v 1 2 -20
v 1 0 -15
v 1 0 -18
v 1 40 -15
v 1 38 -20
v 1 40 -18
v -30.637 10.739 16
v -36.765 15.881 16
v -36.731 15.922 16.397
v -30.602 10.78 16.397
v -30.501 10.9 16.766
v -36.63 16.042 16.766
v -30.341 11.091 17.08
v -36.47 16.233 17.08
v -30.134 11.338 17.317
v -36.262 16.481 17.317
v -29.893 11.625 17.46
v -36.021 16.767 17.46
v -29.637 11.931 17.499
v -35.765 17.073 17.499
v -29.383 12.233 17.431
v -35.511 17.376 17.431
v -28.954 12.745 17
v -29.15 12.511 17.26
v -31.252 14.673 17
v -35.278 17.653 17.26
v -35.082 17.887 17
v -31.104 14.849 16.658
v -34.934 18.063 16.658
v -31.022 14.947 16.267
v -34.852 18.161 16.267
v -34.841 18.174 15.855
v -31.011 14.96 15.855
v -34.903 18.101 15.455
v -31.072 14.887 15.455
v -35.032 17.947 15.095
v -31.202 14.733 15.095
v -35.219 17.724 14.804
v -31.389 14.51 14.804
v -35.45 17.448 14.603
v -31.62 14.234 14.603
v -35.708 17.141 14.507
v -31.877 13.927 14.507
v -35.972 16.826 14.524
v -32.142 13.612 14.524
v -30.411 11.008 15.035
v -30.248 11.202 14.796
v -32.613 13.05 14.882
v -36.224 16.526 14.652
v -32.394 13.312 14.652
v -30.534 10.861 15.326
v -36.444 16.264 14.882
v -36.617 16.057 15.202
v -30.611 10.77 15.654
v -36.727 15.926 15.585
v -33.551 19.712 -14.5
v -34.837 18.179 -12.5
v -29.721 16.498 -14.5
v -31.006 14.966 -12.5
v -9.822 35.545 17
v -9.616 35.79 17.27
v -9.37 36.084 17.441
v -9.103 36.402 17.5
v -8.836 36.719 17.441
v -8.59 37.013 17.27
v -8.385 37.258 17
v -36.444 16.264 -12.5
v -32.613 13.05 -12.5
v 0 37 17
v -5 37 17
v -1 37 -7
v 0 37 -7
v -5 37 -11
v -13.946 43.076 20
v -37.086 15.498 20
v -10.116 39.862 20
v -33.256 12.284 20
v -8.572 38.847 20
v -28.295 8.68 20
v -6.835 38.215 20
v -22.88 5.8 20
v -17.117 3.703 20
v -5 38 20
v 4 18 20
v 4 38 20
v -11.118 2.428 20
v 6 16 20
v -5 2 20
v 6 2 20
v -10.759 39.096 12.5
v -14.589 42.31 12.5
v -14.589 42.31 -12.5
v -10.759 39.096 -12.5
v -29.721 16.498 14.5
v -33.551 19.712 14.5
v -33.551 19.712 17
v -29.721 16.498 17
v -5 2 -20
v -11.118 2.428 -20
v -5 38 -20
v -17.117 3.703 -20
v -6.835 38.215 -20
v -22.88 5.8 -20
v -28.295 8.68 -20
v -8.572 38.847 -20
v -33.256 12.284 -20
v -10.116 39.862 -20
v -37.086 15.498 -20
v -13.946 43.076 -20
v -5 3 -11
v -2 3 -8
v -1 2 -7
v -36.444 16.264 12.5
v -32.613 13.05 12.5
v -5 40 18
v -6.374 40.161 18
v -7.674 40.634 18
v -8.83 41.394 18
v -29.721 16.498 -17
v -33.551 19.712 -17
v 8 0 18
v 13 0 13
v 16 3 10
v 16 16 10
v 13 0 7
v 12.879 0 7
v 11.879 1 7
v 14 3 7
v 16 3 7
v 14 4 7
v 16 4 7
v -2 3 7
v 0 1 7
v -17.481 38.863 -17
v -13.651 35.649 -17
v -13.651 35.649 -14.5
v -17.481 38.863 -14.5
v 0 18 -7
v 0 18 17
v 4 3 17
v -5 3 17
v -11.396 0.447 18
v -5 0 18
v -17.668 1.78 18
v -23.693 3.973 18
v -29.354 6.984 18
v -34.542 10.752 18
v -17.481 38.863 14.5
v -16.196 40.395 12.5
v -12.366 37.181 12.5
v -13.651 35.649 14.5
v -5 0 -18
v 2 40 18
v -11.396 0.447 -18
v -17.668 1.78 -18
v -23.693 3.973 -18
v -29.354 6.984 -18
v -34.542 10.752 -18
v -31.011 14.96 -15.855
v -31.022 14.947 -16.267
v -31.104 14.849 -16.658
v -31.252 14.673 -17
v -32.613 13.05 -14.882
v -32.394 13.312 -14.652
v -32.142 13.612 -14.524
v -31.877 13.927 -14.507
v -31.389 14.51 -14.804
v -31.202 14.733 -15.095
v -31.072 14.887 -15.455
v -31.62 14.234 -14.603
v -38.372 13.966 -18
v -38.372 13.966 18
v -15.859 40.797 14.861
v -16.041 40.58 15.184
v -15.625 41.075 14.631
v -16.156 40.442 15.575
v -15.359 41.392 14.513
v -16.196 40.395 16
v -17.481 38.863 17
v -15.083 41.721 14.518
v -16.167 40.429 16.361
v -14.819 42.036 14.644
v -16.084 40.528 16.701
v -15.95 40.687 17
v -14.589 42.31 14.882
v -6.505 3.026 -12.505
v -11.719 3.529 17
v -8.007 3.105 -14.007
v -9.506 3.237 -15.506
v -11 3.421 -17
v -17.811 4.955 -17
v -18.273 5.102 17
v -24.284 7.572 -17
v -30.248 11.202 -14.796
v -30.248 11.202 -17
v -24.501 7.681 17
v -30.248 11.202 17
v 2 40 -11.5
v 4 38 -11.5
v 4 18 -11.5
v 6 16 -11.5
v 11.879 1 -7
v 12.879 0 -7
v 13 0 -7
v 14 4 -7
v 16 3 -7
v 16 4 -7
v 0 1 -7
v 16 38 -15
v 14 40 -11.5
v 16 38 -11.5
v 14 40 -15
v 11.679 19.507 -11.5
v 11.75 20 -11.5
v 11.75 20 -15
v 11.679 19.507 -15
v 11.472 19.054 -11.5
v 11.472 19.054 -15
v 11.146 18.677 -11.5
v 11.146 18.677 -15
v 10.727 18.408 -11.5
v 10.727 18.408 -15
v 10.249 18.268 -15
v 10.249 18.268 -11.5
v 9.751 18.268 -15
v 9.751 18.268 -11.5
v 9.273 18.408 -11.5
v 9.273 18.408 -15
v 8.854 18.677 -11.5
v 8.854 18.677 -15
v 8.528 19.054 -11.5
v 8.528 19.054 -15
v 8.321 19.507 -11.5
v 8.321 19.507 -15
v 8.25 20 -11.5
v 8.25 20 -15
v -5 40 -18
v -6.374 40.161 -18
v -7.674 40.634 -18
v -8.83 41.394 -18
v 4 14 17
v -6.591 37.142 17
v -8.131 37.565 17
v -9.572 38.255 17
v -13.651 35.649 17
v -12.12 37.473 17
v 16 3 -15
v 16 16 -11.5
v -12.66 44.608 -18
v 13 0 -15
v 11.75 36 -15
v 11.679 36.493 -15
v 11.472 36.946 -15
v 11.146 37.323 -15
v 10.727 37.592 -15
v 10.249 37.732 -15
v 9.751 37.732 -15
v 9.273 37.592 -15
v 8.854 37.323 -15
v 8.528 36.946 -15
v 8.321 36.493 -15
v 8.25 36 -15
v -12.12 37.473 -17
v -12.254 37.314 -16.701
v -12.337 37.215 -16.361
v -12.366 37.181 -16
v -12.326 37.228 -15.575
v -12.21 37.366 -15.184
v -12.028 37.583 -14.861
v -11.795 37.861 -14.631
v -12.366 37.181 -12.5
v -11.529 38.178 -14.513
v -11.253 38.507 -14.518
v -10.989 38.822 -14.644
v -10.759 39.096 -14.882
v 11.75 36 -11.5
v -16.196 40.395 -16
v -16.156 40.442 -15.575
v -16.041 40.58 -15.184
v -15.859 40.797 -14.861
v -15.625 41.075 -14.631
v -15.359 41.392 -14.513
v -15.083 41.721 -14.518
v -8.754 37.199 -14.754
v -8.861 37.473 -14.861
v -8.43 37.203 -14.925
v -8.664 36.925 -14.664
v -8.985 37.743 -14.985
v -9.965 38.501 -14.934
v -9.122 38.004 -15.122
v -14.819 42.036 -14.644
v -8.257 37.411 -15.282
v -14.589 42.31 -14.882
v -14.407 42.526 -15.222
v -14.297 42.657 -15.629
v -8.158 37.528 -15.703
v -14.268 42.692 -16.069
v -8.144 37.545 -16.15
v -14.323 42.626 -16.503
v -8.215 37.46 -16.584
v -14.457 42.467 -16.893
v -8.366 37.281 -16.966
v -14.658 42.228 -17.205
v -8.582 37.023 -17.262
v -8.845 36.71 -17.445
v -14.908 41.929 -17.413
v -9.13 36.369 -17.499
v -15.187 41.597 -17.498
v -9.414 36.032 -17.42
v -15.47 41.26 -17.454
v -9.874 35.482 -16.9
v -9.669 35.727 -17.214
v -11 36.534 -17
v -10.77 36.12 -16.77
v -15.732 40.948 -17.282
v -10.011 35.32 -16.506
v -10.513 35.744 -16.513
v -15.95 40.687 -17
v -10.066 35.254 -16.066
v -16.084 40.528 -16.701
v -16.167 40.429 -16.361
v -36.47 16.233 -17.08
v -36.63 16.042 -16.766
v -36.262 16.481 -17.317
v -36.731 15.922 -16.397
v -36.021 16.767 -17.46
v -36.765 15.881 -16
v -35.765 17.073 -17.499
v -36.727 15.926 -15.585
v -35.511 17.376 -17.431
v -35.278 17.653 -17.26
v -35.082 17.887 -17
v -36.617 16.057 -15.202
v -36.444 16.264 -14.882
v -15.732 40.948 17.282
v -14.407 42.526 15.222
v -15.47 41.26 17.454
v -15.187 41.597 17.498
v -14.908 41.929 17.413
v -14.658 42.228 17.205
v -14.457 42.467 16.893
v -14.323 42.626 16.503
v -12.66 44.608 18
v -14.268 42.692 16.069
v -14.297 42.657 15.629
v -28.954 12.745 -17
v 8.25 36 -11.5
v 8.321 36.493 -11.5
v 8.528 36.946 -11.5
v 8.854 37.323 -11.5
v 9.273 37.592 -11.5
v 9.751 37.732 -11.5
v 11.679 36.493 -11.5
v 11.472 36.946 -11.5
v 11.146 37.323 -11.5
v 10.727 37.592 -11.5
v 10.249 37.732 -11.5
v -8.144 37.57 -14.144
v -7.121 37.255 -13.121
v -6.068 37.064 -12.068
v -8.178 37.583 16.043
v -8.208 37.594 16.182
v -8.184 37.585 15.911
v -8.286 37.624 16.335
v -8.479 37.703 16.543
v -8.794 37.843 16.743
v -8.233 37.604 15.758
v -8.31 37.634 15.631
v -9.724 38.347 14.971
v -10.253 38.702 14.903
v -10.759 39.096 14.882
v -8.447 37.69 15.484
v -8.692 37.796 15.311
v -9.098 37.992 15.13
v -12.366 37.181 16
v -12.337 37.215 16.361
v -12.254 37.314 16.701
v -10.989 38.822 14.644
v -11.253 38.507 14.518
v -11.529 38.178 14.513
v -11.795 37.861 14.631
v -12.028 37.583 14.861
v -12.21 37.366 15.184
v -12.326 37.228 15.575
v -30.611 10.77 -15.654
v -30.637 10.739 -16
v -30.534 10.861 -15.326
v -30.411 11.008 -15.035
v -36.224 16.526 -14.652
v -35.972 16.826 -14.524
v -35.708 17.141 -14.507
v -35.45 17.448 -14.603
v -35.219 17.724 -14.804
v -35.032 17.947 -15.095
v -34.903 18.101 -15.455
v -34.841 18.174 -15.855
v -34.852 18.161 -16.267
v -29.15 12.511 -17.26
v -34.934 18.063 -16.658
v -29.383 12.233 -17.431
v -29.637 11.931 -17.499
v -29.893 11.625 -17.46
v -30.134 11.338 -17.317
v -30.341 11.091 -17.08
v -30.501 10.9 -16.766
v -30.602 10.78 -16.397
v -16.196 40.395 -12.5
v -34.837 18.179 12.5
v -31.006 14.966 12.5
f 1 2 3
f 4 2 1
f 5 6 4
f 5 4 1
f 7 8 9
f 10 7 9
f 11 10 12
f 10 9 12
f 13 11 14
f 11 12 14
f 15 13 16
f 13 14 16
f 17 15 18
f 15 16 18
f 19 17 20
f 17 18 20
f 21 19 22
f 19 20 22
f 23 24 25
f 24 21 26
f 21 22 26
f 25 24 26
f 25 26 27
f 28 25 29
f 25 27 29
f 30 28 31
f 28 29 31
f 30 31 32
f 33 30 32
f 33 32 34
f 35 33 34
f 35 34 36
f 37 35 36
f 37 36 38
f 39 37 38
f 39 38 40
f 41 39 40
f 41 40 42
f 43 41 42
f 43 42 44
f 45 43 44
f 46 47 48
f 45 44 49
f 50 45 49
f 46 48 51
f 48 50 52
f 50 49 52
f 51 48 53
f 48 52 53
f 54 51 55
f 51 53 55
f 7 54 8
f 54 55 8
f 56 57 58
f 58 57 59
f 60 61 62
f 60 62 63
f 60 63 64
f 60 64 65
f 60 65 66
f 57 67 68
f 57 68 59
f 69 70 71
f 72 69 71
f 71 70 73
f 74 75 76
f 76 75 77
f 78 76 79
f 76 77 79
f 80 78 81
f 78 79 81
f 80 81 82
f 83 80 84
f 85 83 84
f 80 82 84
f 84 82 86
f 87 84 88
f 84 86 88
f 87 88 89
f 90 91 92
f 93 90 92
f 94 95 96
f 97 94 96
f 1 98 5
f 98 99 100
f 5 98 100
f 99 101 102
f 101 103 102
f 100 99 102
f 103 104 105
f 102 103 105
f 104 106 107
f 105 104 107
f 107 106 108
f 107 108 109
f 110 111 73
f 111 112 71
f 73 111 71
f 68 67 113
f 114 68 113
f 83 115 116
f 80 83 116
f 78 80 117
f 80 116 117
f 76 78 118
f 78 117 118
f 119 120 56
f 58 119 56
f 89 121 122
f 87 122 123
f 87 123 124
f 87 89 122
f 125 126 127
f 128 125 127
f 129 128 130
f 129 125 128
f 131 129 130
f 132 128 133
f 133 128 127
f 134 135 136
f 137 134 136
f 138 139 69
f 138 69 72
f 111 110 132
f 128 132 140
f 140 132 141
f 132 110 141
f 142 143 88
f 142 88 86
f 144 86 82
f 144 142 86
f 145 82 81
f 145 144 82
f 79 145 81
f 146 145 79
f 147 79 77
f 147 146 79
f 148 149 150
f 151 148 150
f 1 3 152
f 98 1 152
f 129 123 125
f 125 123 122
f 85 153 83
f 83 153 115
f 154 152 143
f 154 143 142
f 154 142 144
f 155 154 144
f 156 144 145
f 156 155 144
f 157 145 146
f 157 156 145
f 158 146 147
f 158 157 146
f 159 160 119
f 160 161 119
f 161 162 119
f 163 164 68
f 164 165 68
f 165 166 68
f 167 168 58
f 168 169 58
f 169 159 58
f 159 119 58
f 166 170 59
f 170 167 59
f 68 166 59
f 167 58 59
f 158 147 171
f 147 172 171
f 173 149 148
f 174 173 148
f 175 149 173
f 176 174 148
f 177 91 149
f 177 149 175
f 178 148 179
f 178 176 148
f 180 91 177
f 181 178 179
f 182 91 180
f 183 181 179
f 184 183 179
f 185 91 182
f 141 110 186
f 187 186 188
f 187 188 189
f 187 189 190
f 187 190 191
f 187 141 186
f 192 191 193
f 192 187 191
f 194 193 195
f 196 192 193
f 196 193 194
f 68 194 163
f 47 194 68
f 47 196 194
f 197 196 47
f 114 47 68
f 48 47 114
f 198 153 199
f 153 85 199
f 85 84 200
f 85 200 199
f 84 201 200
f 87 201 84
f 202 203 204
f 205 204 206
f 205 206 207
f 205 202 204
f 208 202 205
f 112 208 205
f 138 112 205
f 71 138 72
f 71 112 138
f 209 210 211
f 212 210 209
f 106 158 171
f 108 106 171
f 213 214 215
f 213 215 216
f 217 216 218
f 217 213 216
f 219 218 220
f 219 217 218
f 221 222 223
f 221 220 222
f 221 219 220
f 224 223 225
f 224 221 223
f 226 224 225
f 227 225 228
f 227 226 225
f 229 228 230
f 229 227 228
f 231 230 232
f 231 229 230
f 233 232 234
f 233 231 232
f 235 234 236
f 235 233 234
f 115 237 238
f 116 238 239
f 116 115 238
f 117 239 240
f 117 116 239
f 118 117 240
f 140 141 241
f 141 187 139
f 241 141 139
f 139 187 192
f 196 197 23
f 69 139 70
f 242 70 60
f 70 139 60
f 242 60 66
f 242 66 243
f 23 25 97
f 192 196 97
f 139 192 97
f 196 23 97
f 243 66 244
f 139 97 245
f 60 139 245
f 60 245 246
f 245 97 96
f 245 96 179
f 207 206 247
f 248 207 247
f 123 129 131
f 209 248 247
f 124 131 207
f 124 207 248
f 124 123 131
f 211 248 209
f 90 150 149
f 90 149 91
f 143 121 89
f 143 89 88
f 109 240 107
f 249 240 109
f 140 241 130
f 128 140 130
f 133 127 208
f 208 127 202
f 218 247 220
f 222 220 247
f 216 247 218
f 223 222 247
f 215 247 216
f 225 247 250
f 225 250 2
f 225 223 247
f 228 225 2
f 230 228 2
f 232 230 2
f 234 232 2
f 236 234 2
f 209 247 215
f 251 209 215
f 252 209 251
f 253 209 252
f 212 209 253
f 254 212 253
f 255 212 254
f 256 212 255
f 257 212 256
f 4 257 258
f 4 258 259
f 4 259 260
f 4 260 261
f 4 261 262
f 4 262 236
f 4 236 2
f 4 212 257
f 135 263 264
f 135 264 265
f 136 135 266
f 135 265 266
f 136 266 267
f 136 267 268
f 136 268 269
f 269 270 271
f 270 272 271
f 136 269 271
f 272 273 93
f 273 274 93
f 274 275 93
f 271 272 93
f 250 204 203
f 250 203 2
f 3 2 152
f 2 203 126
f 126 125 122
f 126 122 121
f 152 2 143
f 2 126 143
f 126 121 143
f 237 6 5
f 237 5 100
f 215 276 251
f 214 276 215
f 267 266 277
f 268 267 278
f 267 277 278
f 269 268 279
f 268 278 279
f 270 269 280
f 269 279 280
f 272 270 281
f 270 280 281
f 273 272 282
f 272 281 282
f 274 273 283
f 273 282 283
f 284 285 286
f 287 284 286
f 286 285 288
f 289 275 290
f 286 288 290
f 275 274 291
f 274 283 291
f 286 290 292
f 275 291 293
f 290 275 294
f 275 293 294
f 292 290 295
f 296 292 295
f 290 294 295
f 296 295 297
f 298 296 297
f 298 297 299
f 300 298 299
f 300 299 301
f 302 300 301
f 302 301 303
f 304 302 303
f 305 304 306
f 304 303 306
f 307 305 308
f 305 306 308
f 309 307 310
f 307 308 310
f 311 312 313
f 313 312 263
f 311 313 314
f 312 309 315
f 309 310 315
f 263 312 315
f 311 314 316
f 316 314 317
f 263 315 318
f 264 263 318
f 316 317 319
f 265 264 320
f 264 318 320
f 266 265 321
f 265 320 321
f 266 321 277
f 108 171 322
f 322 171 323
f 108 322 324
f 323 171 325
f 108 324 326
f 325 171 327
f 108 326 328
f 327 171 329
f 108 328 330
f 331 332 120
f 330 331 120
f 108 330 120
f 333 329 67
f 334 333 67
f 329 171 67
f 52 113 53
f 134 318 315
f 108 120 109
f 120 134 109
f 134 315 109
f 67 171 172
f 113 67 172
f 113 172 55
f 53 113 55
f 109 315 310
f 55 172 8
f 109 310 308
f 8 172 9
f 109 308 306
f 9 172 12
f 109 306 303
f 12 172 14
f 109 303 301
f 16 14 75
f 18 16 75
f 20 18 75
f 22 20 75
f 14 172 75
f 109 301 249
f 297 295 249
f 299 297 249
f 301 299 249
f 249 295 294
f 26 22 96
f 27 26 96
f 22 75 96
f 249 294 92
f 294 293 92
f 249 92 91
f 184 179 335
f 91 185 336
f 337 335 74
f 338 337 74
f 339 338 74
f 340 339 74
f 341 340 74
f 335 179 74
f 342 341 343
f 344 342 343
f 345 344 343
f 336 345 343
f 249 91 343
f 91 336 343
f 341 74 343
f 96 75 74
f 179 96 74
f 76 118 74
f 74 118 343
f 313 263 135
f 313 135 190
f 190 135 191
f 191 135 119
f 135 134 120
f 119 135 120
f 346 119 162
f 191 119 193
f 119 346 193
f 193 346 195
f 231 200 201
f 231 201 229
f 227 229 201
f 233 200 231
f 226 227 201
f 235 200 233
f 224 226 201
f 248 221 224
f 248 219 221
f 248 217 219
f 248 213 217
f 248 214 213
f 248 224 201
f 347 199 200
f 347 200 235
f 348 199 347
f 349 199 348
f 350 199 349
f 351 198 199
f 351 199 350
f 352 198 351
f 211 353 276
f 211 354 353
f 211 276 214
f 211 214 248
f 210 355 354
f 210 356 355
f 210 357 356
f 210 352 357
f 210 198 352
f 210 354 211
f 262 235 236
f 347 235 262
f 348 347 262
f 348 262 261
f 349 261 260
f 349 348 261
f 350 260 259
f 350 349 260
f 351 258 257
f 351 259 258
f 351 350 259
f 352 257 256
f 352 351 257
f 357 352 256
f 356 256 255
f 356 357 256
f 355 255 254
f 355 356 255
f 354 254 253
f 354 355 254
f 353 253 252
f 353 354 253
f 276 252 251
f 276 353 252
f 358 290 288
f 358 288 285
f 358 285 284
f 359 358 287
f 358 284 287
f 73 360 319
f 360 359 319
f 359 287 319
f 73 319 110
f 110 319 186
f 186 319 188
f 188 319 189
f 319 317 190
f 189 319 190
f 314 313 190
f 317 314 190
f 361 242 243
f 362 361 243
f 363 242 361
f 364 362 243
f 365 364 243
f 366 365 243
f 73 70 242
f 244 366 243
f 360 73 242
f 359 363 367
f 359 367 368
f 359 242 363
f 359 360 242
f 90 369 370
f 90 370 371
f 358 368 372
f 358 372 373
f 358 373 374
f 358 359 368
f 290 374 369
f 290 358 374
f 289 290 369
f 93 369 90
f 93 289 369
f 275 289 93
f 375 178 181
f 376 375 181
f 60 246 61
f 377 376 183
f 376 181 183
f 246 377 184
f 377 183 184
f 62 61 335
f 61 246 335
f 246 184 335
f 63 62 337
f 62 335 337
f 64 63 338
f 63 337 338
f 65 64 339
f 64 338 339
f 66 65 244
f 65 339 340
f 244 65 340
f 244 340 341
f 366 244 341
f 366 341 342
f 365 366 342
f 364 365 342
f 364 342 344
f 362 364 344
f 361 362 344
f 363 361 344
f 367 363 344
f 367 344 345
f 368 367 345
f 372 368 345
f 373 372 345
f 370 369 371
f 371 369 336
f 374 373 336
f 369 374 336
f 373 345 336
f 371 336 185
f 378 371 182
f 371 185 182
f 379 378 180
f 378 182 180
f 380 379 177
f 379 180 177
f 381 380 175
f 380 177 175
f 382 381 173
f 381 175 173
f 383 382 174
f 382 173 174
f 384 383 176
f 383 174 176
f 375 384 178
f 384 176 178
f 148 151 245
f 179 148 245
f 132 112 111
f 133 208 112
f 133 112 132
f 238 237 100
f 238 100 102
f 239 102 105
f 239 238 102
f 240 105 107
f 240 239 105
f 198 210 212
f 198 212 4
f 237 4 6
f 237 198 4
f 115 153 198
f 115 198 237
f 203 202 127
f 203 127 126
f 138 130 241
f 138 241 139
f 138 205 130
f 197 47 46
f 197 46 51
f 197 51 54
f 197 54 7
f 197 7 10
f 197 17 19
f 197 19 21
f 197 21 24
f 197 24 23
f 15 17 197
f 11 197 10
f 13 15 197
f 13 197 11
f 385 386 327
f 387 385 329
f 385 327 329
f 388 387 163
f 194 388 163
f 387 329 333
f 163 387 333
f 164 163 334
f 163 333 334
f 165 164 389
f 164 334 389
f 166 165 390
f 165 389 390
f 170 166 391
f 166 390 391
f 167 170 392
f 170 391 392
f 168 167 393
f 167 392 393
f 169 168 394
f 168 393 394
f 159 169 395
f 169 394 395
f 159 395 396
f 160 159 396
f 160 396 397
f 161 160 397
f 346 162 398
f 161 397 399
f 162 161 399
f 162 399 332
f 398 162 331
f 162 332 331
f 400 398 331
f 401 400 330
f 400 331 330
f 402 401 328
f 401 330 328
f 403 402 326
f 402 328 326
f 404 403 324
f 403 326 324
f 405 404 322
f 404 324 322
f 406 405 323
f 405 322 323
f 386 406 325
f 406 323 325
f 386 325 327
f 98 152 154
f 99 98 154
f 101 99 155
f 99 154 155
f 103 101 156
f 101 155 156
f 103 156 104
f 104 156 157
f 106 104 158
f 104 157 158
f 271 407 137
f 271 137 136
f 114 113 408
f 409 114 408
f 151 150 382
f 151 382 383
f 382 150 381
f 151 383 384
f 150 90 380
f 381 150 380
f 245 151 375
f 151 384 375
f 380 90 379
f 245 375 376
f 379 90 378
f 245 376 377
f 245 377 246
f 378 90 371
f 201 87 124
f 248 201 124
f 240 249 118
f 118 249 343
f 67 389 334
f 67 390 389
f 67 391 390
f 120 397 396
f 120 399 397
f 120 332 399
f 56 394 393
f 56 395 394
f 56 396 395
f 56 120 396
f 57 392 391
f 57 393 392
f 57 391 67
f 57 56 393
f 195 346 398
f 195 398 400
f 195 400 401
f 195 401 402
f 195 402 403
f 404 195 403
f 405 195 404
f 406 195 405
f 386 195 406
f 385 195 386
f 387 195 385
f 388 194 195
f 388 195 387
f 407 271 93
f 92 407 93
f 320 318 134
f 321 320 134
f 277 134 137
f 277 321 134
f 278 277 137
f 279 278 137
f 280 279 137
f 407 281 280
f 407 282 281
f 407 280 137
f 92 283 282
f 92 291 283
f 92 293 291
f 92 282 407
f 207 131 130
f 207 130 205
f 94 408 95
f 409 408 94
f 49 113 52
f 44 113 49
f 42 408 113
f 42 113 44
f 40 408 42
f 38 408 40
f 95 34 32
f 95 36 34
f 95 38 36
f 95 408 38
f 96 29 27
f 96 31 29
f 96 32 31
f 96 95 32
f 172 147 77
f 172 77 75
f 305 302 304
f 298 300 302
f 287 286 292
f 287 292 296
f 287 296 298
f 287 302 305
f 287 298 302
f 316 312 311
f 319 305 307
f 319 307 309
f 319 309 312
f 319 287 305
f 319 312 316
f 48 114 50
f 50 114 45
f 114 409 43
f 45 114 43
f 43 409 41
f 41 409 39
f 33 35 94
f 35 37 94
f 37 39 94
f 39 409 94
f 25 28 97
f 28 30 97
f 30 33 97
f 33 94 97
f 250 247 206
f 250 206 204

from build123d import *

# Parameters (mm, degrees)
SKETCH3_W                = 40
SKETCH3_H                = 40
SKETCH3_W_2              = 34
SKETCH3_H_2              = 34
BOSS_EXTRUDE2_REACH      = 64.147
SKETCH7_W                = 16
SKETCH7_H                = 28
BOSS_EXTRUDE5_DEPTH      = 1
BOSS_EXTRUDE5_DEPTH_BACK = 5
SKETCH8_W                = 13
SKETCH8_H                = 40
CHAMFER1_SIZE            = 6
CHAMFER2_SIZE            = 4
SKETCH9_W                = 14
SKETCH9_H                = 3
CUT_EXTRUDE1_DEPTH       = 16
SKETCH10_W               = 12
SKETCH10_H               = 24
CUT_EXTRUDE2_DEPTH       = 72.149717806
SKETCH11_W               = 15
SKETCH11_H               = 40
BOSS_EXTRUDE6_DEPTH      = 7
CUT_EXTRUDE3_DEPTH       = 66.163504693
CUT_EXTRUDE4_REACH       = 60.927
SKETCH13_W               = 12
SKETCH13_H               = 3.5
SKETCH15_W               = 4.5
SKETCH15_H               = 4.5
BOSS_EXTRUDE7_DEPTH      = 5
SKETCH14_R               = 1.5
CUT_EXTRUDE5_DEPTH       = 8
CHAMFER3_SIZE            = 14
CHAMFER7_SIZE            = 3
CHAMFER4_SIZE            = 14
CHAMFER5_SIZE            = 2
CHAMFER9_SIZE            = 2
CHAMFER10_SIZE           = 2.121320344
CHAMFER10_SIZE_2         = 1.5
CHAMFER11_SIZE           = 10
CHAMFER12_SIZE           = 2


# Some blends are built 0.0001 mm under size
with BuildPart() as part:
    # Sweep1: sweep along a path in Sketch2
    with BuildLine(Plane.XY) as sweep1_path:
        Line((0, 0), (-5, 0))
        ThreePointArc((-5, 0), (-20.718824406, 2.771652848), (-34.541726603, 10.752309152))
        Line((-34.541726603, 10.752309152), (-38.371948819, 13.966247201))
    # Sketch3 → Sweep1 (sweep)
    with BuildSketch(Plane(origin=(0, 0, 0), x_dir=(0, 0, -1), z_dir=(1, 0, 0))):
        with Locations((0, 20)):
            Rectangle(SKETCH3_W, SKETCH3_H)
        with Locations((0, 20)):
            Rectangle(SKETCH3_W_2, SKETCH3_H_2, mode=Mode.SUBTRACT)
    sweep(path=sweep1_path.line)

    # Boss-Extrude2: up to this face of the body (flat: up to its plane)
    boss_extrude2_end = Plane(part.part.faces().sort_by_distance((-2.5, 40, 0))[0])
    # Sketch7 → Boss-Extrude2 (add, up to the picked face)
    with BuildSketch(Plane(origin=(0, 0, 0), x_dir=(1, 0, 0), z_dir=(0, 1, 0)), mode=Mode.PRIVATE) as boss_extrude2_sk1:
        with Locations((8, -6)):
            Rectangle(SKETCH7_W, SKETCH7_H)
    boss_extrude2_tool1 = split(extrude(boss_extrude2_sk1.sketch, amount=BOSS_EXTRUDE2_REACH, mode=Mode.PRIVATE), bisect_by=boss_extrude2_end, keep=Keep.BOTH, mode=Mode.PRIVATE)
    add(boss_extrude2_tool1.solids().sort_by(Axis((8, 0, 6), (0, 1, 0)))[0])

    # Sketch8 → Boss-Extrude5 (add, two sides: drawn at the far end of the back side and taken through both)
    with BuildSketch(Plane(origin=(0, 0, 0), x_dir=(0, 0, -1), z_dir=(1, 0, 0)).offset(-BOSS_EXTRUDE5_DEPTH_BACK)):
        with Locations((13.5, 20)):
            Rectangle(SKETCH8_W, SKETCH8_H)
    extrude(amount=BOSS_EXTRUDE5_DEPTH + BOSS_EXTRUDE5_DEPTH_BACK)

    # Chamfer1
    chamfer1_edges = [part.edges().sort_by_distance(p)[0] for p in [
        (-5, 20, -17),
    ]]
    chamfer(chamfer1_edges, length=CHAMFER1_SIZE)

    # Chamfer2
    chamfer2_edges = [part.edges().sort_by_distance(p)[0] for p in [
        (-5, 20, -7),
    ]]
    chamfer(chamfer2_edges, length=CHAMFER2_SIZE - 0.0001)  # a hair under: the kernel refuses the full size

    # Sketch9 → Cut-Extrude1 (cut)
    with BuildSketch(Plane(origin=(16, 0, 0), x_dir=(0, 0, -1), z_dir=(1, 0, 0))):
        with Locations((0, 2.5)):
            Rectangle(SKETCH9_W, SKETCH9_H)
    extrude(amount=-CUT_EXTRUDE1_DEPTH, mode=Mode.SUBTRACT)

    # Sketch10 → Cut-Extrude2 (cut, through all)
    with BuildSketch(Plane.XY.offset(20)):
        with Locations((10, 28)):
            Rectangle(SKETCH10_W, SKETCH10_H)
    extrude(amount=-CUT_EXTRUDE2_DEPTH, mode=Mode.SUBTRACT)

    # Sketch11 → Boss-Extrude6 (add)
    with BuildSketch(Plane(origin=(0, 0, -8), x_dir=(-1, 0, 0), z_dir=(0, 0, -1))):
        with Locations((-8.5, 20)):
            Rectangle(SKETCH11_W, SKETCH11_H)
    extrude(amount=BOSS_EXTRUDE6_DEPTH)

    # Sketch12 → Cut-Extrude3 (cut, through all)
    with BuildSketch(Plane.XY.offset(-8)):
        with BuildLine():
            Line((11.75, 36), (11.75, 20))
            ThreePointArc((11.75, 20), (10, 18.25), (8.25, 20))
            Line((8.25, 20), (8.25, 36))
            ThreePointArc((8.25, 36), (10, 37.75), (11.75, 36))
        make_face()
    extrude(amount=-CUT_EXTRUDE3_DEPTH, mode=Mode.SUBTRACT)

    # Cut-Extrude4: up to this face of the body (flat: up to its plane)
    cut_extrude4_end = Plane(part.part.faces().sort_by_distance((10, 16, 6))[0])
    # Sketch13 → Cut-Extrude4 (cut, up to the picked face)
    with BuildSketch(Plane(origin=(0, 40, 0), x_dir=(1, 0, 0), z_dir=(0, 1, 0)), mode=Mode.PRIVATE) as cut_extrude4_sk1:
        with Locations((10, 9.75)):
            Rectangle(SKETCH13_W, SKETCH13_H)
    cut_extrude4_tool1 = split(extrude(cut_extrude4_sk1.sketch, amount=-CUT_EXTRUDE4_REACH, mode=Mode.PRIVATE), bisect_by=cut_extrude4_end, keep=Keep.BOTH, mode=Mode.PRIVATE)
    add(cut_extrude4_tool1.solids().sort_by(Axis((10, 40, -9.75), (0, -1, 0)))[0], mode=Mode.SUBTRACT)

    # Sketch15 → Boss-Extrude7 (add)
    with BuildSketch(Plane(origin=(-29.394618164, 24.66501326, 0), x_dir=(0, 0, 1), z_dir=(-0.7660444431189811, 0.6427876096865356, 0))):
        with Locations((-14.75, 20.783752799)):
            Rectangle(SKETCH15_W, SKETCH15_H)
        with Locations((14.75, 20.783752799)):
            Rectangle(SKETCH15_W, SKETCH15_H)
        with Locations((-14.75, -8.716247201)):
            Rectangle(SKETCH15_W, SKETCH15_H)
        with Locations((14.75, -8.716247201)):
            Rectangle(SKETCH15_W, SKETCH15_H)
    extrude(amount=-BOSS_EXTRUDE7_DEPTH)

    # Sketch14 → Cut-Extrude5 (cut)
    with BuildSketch(Plane(origin=(-29.394618164, 24.66501326, 0), x_dir=(0, 0, 1), z_dir=(-0.7660444431189811, 0.6427876096865356, 0))):
        with Locations(Location((-16, 22.033752799, 0), (0, 0, 270))):
            Circle(SKETCH14_R)
        with Locations(Location((16, 22.033752799, 0), (0, 0, 270))):
            Circle(SKETCH14_R)
        with Locations(Location((-16, -9.966247201, 0), (0, 0, 270))):
            Circle(SKETCH14_R)
        with Locations(Location((16, -9.966247201, 0), (0, 0, 270))):
            Circle(SKETCH14_R)
    extrude(amount=-CUT_EXTRUDE5_DEPTH, mode=Mode.SUBTRACT)

    # Chamfer3
    chamfer3_edges = [part.edges().sort_by_distance(p)[0] for p in [
        (0, 4, 0),
    ]]
    chamfer(chamfer3_edges, length=CHAMFER3_SIZE)

    # Chamfer7
    # the kernel refuses this chamfer: 3 mm, written as the material it takes off along each edge
    with BuildSketch(Plane(origin=(16, 0, 27.715048964), x_dir=(0.027495876610586778, 0.9996219169112968, 0), z_dir=(0, 0, -1))) as chamfer7_piece_1:
        Polygon((CHAMFER7_SIZE * 0.999621916911, -CHAMFER7_SIZE * 0.0274958766106), (-CHAMFER7_SIZE * 0.0274958766106, -CHAMFER7_SIZE * 0.999621916911), (0, 0), align=None)
    extrude(amount=50.430097928, mode=Mode.SUBTRACT)

    # Chamfer4
    # the kernel refuses this chamfer: 14 mm, written as the material it takes off along each edge
    with BuildSketch(Plane(origin=(0, 54.003561832, 7), x_dir=(-0.027495876610586376, 0, 0.9996219169112968), z_dir=(0, -1, 0))) as chamfer4_piece_1_section:
        Polygon((CHAMFER4_SIZE * 0.999621916911, -CHAMFER4_SIZE * 0.0274958766106), (-CHAMFER4_SIZE * 0.0274958766106, -CHAMFER4_SIZE * 0.999621916911), (0, 0), align=None)
    chamfer4_piece_1 = extrude(amount=51.003561832, mode=Mode.PRIVATE)
    chamfer4_piece_1 = split(chamfer4_piece_1, bisect_by=Plane(origin=(0.666666667, 16.666666667, 17), z_dir=(0, 0, -1)), keep=Keep.TOP, mode=Mode.PRIVATE)
    chamfer4_piece_1 = split(chamfer4_piece_1, bisect_by=Plane(origin=(1, 17, 12), z_dir=(-0.7071067811865476, -0.7071067811865476, 0)), keep=Keep.TOP, mode=Mode.PRIVATE)
    add(chamfer4_piece_1, mode=Mode.SUBTRACT)

    # Chamfer5
    chamfer5_edges = [part.edges().sort_by_distance(p)[0] for p in [
        (0, 3, 0),
    ]]
    chamfer(chamfer5_edges, length=CHAMFER5_SIZE - 0.0001)  # a hair under: the kernel refuses the full size

    # Chamfer9
    chamfer9_edges = [part.edges().sort_by_distance(p)[0] for p in [
        (4, 16, 4.25),
        (4, 40, 4.25),
        (16, 40, -13.25),
    ]]
    chamfer(chamfer9_edges, length=CHAMFER9_SIZE)

    # Chamfer10
    # the kernel refuses this chamfer: 2.121320344, 1.5 mm, written as the material it takes off along each edge
    with BuildSketch(Plane(origin=(14, 1, -7), x_dir=(-0.9996219169112964, 0.02749587661059746, 0), z_dir=(0, 0, 1))) as chamfer10_piece_1:
        Polygon((CHAMFER10_SIZE * 0.999621916703, CHAMFER10_SIZE * 0.0274958766049), (CHAMFER10_SIZE_2 * 0.687396915265, CHAMFER10_SIZE_2 * 0.726281956876), (0, 0), align=None)
    extrude(amount=14, mode=Mode.SUBTRACT)

    # Chamfer11
    chamfer11_edges = [part.edges().sort_by_distance(p)[0] for p in [
        (16, 9.5, 20),
    ]]
    chamfer(chamfer11_edges, length=CHAMFER11_SIZE)

    # Chamfer12
    chamfer12_edges = [part.edges().sort_by_distance(p)[0] for p in [
        (-10.745333323, 43.001055901, -20),
        (-7.038018673, 40.359357679, -20),
        (-2, 40, -20),
        (-36.456837711, 12.359278177, -20),
        (-20.718824406, 2.771652848, -20),
        (-2, 0, -20),
        (-36.456837711, 12.359278177, 20),
        (-20.718824406, 2.771652848, 20),
        (0.5, 0, 20),
        (-10.745333323, 43.001055901, 20),
        (-7.038018673, 40.359357679, 20),
        (-1.5, 40, 20),
        (-31.635930638, 18.1046115, 12.5),
        (-15.566240396, 37.255722578, 12.5),
        (-15.566240396, 37.255722578, -12.5),
        (-31.635930638, 18.1046115, -12.5),
    ]]
    chamfer(chamfer12_edges, length=CHAMFER12_SIZE)


solid = part.part
